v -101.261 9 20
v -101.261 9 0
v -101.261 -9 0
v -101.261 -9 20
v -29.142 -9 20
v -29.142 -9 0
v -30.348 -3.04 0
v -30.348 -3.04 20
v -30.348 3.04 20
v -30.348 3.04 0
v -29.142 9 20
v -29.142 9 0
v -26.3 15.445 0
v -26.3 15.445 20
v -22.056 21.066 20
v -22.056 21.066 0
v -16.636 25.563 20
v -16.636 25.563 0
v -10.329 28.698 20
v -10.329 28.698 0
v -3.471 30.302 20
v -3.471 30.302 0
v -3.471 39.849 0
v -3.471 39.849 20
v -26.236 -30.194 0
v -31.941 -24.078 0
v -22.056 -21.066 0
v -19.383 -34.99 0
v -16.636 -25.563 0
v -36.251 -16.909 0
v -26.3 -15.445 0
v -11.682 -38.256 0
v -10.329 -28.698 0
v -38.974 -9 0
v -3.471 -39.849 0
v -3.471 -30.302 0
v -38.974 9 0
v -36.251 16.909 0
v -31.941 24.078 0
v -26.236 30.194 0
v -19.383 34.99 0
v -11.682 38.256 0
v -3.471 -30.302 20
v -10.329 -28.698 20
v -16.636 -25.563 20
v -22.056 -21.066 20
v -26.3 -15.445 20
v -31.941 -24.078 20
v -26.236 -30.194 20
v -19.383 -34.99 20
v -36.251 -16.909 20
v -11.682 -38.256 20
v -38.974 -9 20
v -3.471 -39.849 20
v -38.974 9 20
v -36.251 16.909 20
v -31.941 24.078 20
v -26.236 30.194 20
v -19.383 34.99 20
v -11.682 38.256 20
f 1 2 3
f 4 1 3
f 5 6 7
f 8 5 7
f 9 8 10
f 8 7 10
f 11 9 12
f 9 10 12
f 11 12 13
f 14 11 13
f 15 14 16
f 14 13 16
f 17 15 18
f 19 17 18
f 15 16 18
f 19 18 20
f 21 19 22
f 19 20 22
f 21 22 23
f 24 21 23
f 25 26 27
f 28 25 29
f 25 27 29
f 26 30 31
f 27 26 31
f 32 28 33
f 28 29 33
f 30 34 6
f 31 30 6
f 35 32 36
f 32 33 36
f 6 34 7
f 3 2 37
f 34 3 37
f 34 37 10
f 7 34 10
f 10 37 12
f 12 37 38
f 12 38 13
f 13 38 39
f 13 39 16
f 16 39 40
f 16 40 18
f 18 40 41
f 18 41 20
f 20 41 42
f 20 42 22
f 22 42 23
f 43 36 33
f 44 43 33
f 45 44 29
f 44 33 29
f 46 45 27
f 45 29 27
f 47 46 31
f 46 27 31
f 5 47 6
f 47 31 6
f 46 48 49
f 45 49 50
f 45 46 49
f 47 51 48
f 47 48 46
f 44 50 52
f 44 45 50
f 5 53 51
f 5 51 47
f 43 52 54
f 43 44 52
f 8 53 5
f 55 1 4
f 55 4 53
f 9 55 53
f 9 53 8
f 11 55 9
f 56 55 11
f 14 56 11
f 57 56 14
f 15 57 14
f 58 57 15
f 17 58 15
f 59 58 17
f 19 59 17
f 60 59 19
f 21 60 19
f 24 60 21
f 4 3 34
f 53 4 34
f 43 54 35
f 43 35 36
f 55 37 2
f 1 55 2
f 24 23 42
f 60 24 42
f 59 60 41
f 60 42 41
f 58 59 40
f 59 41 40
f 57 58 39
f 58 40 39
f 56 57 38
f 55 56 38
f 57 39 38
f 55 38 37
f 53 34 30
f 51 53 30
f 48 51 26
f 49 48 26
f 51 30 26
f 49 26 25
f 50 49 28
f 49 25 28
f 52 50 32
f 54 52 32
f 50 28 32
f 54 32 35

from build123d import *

# Parameters (mm, degrees)
F1_DEPTH = 20


# Not quite as in the source:
# - a feature names something its author has since deleted; it is built from what else it names


with BuildPart() as f1:
    # F0 (on Top) → F1 (new body)
    with BuildSketch(Plane.XY):
        with BuildLine():
            ThreePointArc((-29.1418942418, 9), (-19.4766119099, 23.471505885), (-3.470733695, 30.3018812554))
            Line((-3.470733695, 30.3018812554), (-3.470733695, 39.8491406133))
            ThreePointArc((-3.470733695, 39.8491406133), (-26.2357325621, 30.1941440834), (-38.9743505398, 9))
            Line((-38.9743505398, 9), (-29.1418942418, 9))
        make_face()
        with BuildLine():
            ThreePointArc((-29.1418942418, -9), (-30.5, 0), (-29.1418942418, 9))
            Line((-29.1418942418, 9), (-38.9743505398, 9))
            ThreePointArc((-38.9743505398, 9), (-40, 0), (-38.9743505398, -9))
            Line((-38.9743505398, -9), (-29.1418942418, -9))
        make_face()
        with BuildLine():
            ThreePointArc((-3.470733695, -30.3018812554), (-19.4766119099, -23.471505885), (-29.1418942418, -9))
            Line((-29.1418942418, -9), (-38.9743505398, -9))
            ThreePointArc((-38.9743505398, -9), (-26.2357325621, -30.1941440834), (-3.470733695, -39.8491406133))
            Line((-3.470733695, -39.8491406133), (-3.470733695, -30.3018812554))
        make_face()
        with BuildLine():
            ThreePointArc((-38.9743505398, -9), (-40, 0), (-38.9743505398, 9))
            Line((-38.9743505398, 9), (-101.2608483434, 9))
            Line((-101.2608483434, 9), (-101.2608483434, -9))
            Line((-101.2608483434, -9), (-38.9743505398, -9))
        make_face()
    extrude(amount=F1_DEPTH)


solid = f1.part
